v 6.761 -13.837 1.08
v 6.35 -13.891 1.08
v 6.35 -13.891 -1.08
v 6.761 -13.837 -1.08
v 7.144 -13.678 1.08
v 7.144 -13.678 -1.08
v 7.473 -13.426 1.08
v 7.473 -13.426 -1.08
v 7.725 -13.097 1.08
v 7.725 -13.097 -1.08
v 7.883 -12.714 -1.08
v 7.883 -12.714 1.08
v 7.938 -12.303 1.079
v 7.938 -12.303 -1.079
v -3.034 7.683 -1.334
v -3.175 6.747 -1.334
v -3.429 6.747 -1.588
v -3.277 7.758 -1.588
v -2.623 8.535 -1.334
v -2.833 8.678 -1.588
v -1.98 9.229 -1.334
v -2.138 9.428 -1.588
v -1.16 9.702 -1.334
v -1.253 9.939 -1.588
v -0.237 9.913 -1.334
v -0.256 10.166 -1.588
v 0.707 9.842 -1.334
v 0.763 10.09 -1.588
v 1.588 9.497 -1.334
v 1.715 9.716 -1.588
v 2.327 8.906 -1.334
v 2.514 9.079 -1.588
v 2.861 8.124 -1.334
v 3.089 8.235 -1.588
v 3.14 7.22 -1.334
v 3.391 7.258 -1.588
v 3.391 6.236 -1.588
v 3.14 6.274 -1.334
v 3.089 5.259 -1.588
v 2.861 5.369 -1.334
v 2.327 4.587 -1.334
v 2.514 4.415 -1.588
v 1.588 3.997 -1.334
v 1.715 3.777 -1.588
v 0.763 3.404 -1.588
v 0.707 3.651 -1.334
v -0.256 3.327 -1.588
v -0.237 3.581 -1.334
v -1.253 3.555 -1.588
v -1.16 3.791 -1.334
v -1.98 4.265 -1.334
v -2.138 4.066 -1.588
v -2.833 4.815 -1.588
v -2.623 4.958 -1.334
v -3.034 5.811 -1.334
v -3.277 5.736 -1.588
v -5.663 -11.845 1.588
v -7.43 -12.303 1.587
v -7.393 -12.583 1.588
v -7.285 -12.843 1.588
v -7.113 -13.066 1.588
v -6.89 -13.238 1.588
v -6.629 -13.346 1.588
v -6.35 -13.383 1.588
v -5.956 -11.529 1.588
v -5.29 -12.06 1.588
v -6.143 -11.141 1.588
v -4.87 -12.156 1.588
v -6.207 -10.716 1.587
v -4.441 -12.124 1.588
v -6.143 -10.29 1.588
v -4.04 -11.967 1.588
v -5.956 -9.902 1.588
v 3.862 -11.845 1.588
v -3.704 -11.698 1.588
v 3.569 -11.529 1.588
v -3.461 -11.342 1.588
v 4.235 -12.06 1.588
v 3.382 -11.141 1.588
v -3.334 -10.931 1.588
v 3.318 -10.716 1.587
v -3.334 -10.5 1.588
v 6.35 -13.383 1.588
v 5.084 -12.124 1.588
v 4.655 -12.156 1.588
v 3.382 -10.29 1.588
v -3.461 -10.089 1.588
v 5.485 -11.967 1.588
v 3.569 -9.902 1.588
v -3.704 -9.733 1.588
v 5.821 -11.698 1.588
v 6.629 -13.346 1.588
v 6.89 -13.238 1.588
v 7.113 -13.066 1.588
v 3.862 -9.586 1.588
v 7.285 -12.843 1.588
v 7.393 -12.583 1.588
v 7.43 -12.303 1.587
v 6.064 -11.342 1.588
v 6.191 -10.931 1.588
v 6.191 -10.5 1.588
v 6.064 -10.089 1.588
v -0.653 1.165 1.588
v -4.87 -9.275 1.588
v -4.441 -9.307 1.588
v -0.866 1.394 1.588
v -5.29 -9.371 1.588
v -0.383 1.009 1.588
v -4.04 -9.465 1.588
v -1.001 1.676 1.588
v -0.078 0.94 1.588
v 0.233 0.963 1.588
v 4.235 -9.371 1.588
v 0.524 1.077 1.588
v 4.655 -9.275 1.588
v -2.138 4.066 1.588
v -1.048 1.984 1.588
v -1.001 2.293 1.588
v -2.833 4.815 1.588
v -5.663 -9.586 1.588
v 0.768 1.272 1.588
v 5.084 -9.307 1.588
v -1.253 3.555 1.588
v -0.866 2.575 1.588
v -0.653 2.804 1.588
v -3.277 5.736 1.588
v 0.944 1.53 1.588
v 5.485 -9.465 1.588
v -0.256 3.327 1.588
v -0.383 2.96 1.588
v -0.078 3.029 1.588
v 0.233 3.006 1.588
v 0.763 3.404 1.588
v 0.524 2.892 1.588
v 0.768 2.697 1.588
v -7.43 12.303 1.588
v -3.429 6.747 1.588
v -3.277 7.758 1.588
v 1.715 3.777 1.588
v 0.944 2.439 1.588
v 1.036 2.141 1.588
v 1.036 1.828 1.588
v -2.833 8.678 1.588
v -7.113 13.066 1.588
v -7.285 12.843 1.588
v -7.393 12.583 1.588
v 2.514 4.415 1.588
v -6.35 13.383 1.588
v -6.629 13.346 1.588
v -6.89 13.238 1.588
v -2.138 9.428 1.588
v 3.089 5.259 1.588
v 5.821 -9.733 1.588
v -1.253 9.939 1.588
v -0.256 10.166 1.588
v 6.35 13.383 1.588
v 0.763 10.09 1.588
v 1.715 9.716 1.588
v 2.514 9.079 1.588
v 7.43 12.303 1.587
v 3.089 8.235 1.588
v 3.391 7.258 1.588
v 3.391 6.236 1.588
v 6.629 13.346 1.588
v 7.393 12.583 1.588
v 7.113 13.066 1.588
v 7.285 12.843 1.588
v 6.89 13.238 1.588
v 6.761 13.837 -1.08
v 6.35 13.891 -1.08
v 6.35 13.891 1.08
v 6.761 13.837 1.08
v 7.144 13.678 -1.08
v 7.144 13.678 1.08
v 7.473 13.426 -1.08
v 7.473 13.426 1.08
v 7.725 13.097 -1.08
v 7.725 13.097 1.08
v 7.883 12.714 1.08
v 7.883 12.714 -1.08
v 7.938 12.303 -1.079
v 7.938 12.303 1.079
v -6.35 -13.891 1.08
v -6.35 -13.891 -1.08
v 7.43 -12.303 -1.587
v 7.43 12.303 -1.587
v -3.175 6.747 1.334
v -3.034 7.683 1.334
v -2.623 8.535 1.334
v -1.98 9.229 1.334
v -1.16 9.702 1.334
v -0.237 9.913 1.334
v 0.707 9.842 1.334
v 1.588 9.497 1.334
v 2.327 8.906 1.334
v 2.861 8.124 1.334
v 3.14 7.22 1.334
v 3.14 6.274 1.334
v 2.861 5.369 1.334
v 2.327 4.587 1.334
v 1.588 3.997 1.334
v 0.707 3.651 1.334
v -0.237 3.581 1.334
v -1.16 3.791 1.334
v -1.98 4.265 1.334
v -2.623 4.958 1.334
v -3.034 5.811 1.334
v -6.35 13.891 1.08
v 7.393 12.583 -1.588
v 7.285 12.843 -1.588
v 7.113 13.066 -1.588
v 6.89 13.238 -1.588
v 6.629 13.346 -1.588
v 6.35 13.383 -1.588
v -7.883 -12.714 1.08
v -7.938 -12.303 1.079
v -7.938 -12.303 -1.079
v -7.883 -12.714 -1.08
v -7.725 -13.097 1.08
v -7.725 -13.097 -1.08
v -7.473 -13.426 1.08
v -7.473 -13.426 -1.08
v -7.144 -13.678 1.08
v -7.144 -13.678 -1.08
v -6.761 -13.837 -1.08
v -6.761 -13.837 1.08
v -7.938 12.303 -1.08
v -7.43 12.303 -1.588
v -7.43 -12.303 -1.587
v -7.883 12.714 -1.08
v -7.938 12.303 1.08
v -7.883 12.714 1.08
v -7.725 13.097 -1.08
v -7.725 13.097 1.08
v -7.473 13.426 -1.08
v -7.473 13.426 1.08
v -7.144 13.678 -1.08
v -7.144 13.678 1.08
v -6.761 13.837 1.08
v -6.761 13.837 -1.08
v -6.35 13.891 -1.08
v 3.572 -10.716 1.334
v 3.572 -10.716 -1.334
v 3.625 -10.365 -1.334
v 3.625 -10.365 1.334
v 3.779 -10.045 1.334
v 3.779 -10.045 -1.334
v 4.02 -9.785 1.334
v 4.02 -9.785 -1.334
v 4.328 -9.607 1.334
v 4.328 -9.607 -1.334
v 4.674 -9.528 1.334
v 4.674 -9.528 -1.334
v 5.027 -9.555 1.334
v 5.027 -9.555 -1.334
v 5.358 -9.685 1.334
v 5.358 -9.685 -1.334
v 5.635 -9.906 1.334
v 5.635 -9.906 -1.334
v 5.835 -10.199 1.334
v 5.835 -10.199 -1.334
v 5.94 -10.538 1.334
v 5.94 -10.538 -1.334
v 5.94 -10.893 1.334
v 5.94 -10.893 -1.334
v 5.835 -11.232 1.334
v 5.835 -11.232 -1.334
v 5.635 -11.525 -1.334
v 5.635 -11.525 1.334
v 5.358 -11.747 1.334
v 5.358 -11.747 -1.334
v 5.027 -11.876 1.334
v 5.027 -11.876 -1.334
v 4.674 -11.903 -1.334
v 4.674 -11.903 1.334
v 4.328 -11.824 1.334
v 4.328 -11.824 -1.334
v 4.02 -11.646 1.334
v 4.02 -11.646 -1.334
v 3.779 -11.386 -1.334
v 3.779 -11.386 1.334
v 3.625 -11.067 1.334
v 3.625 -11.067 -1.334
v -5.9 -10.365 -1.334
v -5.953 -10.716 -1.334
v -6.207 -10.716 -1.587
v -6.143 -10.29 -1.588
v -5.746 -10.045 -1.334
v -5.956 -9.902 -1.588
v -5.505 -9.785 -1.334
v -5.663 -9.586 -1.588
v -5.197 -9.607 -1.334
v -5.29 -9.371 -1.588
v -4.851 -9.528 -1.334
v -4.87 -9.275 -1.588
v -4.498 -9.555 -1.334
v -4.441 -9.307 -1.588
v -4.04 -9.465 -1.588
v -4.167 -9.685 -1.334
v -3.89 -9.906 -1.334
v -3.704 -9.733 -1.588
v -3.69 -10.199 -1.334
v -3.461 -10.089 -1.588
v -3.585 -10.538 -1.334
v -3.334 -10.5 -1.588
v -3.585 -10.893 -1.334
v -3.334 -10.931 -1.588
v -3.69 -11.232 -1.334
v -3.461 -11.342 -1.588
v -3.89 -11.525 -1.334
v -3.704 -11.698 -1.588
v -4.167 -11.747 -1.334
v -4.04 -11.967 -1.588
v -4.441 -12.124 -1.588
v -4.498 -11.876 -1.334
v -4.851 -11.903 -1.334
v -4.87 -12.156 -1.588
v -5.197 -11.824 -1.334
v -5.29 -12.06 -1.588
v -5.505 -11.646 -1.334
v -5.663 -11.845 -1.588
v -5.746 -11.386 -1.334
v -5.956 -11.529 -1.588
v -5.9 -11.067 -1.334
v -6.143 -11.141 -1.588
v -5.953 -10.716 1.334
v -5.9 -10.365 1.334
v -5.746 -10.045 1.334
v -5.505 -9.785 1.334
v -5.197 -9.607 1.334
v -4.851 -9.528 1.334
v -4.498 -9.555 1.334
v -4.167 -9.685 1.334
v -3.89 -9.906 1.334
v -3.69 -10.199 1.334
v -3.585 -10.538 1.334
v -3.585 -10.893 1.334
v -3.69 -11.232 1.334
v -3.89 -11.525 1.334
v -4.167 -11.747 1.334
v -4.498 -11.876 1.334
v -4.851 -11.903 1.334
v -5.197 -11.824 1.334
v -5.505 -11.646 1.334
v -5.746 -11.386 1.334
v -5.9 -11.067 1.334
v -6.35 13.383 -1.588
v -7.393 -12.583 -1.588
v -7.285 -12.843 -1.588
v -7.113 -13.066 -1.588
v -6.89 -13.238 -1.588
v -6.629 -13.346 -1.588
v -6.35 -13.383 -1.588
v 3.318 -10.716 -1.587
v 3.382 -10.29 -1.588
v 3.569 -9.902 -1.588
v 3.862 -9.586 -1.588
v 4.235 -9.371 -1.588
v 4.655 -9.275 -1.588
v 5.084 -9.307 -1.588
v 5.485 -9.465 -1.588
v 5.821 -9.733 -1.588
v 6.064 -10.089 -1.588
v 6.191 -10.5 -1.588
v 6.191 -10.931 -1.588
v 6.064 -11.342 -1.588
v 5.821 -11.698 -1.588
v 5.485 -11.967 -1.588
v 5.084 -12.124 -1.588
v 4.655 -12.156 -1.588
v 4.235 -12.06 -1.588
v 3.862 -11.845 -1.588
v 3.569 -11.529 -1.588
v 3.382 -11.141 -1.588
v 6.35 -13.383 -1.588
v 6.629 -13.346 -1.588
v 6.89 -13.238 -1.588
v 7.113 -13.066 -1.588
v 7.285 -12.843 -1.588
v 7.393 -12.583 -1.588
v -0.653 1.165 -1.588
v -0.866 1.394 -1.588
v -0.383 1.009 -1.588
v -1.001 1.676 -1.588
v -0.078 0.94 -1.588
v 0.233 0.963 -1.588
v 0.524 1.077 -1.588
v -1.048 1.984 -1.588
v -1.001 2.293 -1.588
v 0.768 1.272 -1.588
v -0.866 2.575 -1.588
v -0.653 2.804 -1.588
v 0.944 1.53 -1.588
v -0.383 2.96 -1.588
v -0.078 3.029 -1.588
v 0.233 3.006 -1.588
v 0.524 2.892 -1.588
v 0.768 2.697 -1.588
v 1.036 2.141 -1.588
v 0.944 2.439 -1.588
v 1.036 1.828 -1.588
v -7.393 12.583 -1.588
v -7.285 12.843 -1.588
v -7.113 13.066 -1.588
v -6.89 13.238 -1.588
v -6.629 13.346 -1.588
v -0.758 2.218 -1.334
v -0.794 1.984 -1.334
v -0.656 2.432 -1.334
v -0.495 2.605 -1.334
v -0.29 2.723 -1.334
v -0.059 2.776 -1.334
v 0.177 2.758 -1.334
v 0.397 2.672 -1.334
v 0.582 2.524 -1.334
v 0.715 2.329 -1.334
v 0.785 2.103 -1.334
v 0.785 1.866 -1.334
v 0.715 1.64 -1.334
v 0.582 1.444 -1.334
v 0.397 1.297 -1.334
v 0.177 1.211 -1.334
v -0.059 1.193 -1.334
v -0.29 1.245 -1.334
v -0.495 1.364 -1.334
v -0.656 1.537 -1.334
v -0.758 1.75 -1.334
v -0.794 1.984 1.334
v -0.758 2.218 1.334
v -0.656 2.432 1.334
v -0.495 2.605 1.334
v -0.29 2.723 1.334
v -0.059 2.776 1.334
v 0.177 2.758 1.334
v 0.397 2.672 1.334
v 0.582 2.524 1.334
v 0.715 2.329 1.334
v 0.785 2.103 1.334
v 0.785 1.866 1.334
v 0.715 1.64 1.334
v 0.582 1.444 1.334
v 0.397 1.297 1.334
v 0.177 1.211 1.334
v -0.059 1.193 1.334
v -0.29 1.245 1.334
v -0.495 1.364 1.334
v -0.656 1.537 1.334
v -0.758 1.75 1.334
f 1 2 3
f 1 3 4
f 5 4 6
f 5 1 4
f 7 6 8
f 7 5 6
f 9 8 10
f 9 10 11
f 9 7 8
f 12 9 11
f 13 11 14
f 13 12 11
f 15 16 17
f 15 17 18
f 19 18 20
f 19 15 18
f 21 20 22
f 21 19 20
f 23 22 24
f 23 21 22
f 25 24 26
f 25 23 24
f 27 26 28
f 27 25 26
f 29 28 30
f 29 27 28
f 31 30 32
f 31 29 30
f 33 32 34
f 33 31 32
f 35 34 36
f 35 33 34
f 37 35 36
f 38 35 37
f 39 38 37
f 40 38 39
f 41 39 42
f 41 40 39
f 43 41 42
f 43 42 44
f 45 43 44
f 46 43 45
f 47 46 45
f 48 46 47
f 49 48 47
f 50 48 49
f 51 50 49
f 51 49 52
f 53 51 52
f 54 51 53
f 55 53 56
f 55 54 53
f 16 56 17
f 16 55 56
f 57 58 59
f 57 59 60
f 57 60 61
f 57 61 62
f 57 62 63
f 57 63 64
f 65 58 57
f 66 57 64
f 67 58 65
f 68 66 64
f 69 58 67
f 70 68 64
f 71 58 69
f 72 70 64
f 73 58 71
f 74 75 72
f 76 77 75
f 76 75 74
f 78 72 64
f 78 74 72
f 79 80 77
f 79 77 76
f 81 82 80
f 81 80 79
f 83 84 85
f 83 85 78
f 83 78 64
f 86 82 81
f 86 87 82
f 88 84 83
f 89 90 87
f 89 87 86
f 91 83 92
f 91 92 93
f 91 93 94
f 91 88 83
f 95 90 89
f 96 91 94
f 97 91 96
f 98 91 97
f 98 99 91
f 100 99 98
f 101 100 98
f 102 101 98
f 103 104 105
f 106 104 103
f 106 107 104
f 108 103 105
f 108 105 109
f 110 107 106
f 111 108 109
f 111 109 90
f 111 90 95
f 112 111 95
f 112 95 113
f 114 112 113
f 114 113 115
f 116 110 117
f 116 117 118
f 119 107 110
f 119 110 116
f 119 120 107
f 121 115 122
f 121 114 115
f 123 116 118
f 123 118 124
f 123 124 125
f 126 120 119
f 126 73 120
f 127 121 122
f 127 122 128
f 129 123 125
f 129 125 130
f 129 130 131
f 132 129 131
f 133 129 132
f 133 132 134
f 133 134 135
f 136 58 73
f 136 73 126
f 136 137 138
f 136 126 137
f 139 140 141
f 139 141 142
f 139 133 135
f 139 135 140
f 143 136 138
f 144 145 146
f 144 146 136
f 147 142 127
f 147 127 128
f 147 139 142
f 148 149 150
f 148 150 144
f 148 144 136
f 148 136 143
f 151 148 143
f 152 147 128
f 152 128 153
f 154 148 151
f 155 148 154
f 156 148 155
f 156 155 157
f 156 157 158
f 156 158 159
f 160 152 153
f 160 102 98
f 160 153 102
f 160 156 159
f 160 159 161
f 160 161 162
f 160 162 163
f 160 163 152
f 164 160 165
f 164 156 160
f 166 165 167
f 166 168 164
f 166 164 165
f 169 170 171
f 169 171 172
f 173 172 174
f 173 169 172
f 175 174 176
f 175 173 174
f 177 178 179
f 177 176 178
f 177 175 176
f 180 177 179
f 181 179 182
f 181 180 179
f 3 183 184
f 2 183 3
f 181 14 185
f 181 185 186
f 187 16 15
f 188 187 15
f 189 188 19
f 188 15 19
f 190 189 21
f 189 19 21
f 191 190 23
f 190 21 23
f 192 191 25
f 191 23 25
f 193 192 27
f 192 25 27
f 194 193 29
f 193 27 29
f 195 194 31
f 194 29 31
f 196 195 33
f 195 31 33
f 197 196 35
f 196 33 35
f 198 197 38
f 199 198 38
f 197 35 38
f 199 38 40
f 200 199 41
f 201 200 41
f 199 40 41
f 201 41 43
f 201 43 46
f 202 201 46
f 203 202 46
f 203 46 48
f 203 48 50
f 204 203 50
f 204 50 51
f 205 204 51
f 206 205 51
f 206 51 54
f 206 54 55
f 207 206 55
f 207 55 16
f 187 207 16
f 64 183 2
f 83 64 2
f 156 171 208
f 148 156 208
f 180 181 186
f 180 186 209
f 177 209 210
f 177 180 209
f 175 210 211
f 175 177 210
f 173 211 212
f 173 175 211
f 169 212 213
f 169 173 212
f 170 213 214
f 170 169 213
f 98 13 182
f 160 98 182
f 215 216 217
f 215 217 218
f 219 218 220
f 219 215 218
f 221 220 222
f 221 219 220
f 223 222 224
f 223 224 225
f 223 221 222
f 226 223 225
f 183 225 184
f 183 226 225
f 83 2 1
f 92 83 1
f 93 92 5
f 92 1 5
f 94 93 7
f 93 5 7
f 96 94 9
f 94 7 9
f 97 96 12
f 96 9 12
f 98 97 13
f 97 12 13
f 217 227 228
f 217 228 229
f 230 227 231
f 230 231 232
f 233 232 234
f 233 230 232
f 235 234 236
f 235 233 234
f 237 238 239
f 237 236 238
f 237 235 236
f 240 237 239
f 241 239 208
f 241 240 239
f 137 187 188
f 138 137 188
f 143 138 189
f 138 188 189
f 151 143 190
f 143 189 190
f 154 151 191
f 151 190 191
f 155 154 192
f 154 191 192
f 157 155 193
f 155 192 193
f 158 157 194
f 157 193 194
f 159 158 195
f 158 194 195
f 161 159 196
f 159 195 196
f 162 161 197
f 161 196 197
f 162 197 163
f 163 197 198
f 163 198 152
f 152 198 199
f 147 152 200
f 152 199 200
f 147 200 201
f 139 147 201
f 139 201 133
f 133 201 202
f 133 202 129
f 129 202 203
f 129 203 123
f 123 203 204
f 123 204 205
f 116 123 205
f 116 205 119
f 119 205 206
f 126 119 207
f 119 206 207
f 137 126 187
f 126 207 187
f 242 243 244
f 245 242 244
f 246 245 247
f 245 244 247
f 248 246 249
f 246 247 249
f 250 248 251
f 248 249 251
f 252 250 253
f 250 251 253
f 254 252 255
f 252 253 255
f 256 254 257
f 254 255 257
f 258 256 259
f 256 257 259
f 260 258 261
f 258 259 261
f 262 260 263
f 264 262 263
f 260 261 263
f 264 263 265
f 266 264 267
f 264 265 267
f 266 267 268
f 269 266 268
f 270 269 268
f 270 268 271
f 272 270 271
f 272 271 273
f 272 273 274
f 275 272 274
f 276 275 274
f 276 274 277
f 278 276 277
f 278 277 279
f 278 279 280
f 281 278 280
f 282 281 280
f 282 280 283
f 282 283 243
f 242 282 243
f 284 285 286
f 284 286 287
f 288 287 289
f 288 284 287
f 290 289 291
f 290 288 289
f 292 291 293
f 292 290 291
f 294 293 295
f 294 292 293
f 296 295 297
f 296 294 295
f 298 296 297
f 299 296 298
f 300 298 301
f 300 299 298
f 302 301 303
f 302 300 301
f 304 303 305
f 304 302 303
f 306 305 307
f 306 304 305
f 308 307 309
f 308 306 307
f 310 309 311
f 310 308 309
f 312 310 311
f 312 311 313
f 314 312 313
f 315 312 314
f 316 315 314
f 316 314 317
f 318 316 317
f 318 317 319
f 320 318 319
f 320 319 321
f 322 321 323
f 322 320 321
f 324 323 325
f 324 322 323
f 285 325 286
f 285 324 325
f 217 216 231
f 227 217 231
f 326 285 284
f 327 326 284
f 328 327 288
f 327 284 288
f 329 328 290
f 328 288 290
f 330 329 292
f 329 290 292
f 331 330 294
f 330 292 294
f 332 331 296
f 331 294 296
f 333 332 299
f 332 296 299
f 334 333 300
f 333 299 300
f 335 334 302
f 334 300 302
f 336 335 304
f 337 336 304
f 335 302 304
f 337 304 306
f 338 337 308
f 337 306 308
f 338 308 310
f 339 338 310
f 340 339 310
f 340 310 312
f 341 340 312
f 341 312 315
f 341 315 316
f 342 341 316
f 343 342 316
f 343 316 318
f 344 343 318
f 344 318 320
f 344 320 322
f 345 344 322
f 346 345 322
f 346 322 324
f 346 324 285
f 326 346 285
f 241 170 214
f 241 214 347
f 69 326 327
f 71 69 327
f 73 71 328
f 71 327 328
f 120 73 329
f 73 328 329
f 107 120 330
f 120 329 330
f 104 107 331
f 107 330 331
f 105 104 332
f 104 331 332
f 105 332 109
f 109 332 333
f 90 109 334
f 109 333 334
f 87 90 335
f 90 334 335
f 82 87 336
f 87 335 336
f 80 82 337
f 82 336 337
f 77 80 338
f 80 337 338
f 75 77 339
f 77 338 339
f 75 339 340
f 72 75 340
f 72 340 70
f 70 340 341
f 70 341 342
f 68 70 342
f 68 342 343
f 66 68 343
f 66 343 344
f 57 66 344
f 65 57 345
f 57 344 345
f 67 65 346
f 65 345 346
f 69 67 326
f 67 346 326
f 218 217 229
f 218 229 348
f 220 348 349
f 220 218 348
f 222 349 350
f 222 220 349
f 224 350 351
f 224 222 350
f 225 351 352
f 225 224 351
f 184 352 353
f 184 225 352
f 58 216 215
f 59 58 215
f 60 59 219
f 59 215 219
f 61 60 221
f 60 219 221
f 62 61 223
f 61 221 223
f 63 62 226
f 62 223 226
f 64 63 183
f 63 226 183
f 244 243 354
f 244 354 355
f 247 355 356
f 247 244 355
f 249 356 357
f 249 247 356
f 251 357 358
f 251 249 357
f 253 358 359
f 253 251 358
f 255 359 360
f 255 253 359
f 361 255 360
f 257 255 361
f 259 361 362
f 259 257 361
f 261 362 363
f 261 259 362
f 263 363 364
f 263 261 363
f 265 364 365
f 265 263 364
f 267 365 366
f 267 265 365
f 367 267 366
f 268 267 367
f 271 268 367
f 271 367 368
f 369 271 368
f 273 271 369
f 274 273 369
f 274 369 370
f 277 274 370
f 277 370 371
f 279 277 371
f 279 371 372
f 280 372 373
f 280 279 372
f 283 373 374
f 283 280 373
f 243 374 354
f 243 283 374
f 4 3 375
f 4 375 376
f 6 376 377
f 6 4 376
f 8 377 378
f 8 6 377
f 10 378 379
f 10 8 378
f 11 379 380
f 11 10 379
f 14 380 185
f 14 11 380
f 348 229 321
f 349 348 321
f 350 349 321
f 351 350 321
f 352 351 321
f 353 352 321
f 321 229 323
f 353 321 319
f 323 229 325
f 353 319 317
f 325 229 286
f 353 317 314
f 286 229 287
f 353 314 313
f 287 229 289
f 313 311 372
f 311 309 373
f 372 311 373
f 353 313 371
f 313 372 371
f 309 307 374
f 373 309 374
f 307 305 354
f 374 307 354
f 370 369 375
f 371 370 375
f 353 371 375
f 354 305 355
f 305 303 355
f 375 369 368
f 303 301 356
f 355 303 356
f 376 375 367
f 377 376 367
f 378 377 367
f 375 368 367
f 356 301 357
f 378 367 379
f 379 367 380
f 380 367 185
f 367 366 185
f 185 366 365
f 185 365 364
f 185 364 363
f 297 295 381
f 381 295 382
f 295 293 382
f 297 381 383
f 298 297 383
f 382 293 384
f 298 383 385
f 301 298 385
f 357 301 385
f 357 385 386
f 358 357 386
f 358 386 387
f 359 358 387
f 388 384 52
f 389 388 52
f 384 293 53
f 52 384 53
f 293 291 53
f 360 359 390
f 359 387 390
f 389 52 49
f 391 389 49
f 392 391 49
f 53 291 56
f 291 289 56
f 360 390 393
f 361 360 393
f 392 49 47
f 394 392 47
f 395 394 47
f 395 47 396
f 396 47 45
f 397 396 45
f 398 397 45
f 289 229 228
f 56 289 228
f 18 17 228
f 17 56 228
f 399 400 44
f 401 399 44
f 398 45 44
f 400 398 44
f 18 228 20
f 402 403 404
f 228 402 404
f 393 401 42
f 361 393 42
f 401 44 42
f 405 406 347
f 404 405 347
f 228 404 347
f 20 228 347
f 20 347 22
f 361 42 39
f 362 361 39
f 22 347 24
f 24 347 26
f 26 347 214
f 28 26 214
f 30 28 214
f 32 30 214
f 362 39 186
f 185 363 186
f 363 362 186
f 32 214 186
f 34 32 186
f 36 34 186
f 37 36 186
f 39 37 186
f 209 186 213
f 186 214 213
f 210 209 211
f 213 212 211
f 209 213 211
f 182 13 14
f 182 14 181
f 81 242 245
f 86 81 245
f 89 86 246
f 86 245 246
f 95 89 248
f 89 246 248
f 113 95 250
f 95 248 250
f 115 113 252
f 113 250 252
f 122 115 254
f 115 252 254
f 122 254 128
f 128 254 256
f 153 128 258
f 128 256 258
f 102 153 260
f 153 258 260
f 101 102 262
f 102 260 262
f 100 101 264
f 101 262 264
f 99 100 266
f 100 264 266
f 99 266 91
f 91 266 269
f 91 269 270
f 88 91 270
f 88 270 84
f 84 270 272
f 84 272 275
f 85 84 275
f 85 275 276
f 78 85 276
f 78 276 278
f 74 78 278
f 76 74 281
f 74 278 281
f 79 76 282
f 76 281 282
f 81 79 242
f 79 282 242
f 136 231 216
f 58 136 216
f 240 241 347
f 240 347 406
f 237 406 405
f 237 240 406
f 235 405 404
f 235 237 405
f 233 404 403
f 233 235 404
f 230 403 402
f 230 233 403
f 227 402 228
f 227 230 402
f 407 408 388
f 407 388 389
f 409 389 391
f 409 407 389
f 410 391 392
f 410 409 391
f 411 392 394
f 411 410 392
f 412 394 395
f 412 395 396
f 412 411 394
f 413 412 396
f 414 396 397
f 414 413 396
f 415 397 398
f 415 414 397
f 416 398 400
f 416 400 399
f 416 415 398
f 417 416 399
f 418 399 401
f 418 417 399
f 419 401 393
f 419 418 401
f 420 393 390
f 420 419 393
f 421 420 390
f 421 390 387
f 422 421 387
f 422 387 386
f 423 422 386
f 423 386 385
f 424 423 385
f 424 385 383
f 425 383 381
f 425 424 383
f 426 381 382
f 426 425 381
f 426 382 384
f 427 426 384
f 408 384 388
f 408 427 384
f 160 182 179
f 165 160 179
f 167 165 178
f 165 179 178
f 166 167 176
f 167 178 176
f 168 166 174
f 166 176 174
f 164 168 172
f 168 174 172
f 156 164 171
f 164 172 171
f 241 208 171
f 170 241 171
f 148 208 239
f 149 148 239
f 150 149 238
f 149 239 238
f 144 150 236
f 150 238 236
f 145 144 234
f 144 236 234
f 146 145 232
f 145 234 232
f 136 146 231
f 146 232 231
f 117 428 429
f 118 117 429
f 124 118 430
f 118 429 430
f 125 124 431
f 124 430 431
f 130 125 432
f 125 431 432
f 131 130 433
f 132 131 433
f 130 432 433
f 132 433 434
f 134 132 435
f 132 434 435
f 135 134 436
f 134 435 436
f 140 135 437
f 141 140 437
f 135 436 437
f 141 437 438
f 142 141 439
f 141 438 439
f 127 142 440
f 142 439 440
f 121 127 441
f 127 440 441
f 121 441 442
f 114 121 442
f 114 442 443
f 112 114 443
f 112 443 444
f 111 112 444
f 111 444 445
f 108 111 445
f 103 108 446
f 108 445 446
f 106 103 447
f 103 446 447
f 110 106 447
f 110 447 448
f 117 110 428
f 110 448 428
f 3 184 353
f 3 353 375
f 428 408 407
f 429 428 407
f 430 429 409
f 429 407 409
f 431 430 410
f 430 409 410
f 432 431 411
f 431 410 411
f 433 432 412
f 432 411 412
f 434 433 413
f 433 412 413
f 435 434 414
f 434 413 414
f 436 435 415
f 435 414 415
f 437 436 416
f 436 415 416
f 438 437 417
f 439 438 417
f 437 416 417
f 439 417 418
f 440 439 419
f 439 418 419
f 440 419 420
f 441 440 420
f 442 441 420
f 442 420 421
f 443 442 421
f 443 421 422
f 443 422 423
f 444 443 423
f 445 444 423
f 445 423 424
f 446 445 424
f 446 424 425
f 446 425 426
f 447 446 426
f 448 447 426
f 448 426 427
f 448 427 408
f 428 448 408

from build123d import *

# Parameters (mm, degrees)
SKETCH1_W                       = 15.875
SKETCH1_H                       = 27.78125
BOSS_EXTRUDE1_DEPTH             = 1.5875
F_3_32_0_09375_DIAMETER_HOLE1_D = 2.38125
F_1_4_0_25_DIAMETER_HOLE1_D     = 6.35
F_1_16_0_0625_DIAMETER_HOLE1_D  = 1.5875
FILLET1_R                       = 1.5875
CHAMFER1_SIZE                   = 0.508
CHAMFER2_SIZE                   = 0.254


with BuildPart() as part:
    # Sketch1 → Boss-Extrude1 (new body, symmetric)
    with BuildSketch(Plane.XY):
        Rectangle(SKETCH1_W, SKETCH1_H)
    extrude(amount=BOSS_EXTRUDE1_DEPTH, both=True)

    # 3/32 (0.09375) Diameter Hole1 (through all)
    with Locations(Plane.XY.offset(1.5875)):
        with Locations((-4.7625, -10.715625), (4.7625, -10.715625)):
            Hole(F_3_32_0_09375_DIAMETER_HOLE1_D / 2)

    # 1/4 (0.25) Diameter Hole1 (through all)
    with Locations(Plane.XY.offset(1.5875)):
        with Locations((0, 6.746875)):
            Hole(F_1_4_0_25_DIAMETER_HOLE1_D / 2)

    # 1/16 (0.0625) Diameter Hole1 (through all)
    with Locations(Plane.XY.offset(1.5875)):
        with Locations((0, 1.984375)):
            Hole(F_1_16_0_0625_DIAMETER_HOLE1_D / 2)

    # Fillet1
    fillet1_edges = [part.edges().sort_by_distance(p)[0] for p in [
        (-7.9375, -13.890625, 0),
        (7.9375, -13.890625, 0),
        (7.9375, 13.890625, 0),
        (-7.9375, 13.890625, 0),
    ]]
    fillet(fillet1_edges, radius=FILLET1_R)

    # Chamfer1
    chamfer1_edges = [part.edges().sort_by_distance(p)[0] for p in [
        (7.9375, 0, -1.5875),
        (7.9375, 0, 1.5875),
        (-7.9375, 0, -1.5875),
        (0, 13.890625, -1.5875),
        (0, -13.890625, -1.5875),
        (7.472532015, 13.425657015, -1.5875),
        (-7.472532015, 13.425657015, -1.5875),
        (-7.472532015, -13.425657015, -1.5875),
        (7.472532015, -13.425657015, -1.5875),
        (0, -13.890625, 1.5875),
        (-7.9375, 0, 1.5875),
        (0, 13.890625, 1.5875),
        (7.472532015, 13.425657015, 1.5875),
        (-7.472532015, 13.425657015, 1.5875),
        (-7.472532015, -13.425657015, 1.5875),
        (7.472532015, -13.425657015, 1.5875),
    ]]
    chamfer(chamfer1_edges, length=CHAMFER1_SIZE)

    # Chamfer2
    chamfer2_edges = [part.edges().sort_by_distance(p)[0] for p in [
        (5.953125, -10.715625, 1.5875),
        (5.953125, -10.715625, -1.5875),
        (-3.571875, -10.715625, 1.5875),
        (-3.571875, -10.715625, -1.5875),
        (3.175, 6.746875, 1.5875),
        (3.175, 6.746875, -1.5875),
        (0.79375, 1.984375, 1.5875),
        (0.79375, 1.984375, -1.5875),
    ]]
    chamfer(chamfer2_edges, length=CHAMFER2_SIZE)


solid = part.part
